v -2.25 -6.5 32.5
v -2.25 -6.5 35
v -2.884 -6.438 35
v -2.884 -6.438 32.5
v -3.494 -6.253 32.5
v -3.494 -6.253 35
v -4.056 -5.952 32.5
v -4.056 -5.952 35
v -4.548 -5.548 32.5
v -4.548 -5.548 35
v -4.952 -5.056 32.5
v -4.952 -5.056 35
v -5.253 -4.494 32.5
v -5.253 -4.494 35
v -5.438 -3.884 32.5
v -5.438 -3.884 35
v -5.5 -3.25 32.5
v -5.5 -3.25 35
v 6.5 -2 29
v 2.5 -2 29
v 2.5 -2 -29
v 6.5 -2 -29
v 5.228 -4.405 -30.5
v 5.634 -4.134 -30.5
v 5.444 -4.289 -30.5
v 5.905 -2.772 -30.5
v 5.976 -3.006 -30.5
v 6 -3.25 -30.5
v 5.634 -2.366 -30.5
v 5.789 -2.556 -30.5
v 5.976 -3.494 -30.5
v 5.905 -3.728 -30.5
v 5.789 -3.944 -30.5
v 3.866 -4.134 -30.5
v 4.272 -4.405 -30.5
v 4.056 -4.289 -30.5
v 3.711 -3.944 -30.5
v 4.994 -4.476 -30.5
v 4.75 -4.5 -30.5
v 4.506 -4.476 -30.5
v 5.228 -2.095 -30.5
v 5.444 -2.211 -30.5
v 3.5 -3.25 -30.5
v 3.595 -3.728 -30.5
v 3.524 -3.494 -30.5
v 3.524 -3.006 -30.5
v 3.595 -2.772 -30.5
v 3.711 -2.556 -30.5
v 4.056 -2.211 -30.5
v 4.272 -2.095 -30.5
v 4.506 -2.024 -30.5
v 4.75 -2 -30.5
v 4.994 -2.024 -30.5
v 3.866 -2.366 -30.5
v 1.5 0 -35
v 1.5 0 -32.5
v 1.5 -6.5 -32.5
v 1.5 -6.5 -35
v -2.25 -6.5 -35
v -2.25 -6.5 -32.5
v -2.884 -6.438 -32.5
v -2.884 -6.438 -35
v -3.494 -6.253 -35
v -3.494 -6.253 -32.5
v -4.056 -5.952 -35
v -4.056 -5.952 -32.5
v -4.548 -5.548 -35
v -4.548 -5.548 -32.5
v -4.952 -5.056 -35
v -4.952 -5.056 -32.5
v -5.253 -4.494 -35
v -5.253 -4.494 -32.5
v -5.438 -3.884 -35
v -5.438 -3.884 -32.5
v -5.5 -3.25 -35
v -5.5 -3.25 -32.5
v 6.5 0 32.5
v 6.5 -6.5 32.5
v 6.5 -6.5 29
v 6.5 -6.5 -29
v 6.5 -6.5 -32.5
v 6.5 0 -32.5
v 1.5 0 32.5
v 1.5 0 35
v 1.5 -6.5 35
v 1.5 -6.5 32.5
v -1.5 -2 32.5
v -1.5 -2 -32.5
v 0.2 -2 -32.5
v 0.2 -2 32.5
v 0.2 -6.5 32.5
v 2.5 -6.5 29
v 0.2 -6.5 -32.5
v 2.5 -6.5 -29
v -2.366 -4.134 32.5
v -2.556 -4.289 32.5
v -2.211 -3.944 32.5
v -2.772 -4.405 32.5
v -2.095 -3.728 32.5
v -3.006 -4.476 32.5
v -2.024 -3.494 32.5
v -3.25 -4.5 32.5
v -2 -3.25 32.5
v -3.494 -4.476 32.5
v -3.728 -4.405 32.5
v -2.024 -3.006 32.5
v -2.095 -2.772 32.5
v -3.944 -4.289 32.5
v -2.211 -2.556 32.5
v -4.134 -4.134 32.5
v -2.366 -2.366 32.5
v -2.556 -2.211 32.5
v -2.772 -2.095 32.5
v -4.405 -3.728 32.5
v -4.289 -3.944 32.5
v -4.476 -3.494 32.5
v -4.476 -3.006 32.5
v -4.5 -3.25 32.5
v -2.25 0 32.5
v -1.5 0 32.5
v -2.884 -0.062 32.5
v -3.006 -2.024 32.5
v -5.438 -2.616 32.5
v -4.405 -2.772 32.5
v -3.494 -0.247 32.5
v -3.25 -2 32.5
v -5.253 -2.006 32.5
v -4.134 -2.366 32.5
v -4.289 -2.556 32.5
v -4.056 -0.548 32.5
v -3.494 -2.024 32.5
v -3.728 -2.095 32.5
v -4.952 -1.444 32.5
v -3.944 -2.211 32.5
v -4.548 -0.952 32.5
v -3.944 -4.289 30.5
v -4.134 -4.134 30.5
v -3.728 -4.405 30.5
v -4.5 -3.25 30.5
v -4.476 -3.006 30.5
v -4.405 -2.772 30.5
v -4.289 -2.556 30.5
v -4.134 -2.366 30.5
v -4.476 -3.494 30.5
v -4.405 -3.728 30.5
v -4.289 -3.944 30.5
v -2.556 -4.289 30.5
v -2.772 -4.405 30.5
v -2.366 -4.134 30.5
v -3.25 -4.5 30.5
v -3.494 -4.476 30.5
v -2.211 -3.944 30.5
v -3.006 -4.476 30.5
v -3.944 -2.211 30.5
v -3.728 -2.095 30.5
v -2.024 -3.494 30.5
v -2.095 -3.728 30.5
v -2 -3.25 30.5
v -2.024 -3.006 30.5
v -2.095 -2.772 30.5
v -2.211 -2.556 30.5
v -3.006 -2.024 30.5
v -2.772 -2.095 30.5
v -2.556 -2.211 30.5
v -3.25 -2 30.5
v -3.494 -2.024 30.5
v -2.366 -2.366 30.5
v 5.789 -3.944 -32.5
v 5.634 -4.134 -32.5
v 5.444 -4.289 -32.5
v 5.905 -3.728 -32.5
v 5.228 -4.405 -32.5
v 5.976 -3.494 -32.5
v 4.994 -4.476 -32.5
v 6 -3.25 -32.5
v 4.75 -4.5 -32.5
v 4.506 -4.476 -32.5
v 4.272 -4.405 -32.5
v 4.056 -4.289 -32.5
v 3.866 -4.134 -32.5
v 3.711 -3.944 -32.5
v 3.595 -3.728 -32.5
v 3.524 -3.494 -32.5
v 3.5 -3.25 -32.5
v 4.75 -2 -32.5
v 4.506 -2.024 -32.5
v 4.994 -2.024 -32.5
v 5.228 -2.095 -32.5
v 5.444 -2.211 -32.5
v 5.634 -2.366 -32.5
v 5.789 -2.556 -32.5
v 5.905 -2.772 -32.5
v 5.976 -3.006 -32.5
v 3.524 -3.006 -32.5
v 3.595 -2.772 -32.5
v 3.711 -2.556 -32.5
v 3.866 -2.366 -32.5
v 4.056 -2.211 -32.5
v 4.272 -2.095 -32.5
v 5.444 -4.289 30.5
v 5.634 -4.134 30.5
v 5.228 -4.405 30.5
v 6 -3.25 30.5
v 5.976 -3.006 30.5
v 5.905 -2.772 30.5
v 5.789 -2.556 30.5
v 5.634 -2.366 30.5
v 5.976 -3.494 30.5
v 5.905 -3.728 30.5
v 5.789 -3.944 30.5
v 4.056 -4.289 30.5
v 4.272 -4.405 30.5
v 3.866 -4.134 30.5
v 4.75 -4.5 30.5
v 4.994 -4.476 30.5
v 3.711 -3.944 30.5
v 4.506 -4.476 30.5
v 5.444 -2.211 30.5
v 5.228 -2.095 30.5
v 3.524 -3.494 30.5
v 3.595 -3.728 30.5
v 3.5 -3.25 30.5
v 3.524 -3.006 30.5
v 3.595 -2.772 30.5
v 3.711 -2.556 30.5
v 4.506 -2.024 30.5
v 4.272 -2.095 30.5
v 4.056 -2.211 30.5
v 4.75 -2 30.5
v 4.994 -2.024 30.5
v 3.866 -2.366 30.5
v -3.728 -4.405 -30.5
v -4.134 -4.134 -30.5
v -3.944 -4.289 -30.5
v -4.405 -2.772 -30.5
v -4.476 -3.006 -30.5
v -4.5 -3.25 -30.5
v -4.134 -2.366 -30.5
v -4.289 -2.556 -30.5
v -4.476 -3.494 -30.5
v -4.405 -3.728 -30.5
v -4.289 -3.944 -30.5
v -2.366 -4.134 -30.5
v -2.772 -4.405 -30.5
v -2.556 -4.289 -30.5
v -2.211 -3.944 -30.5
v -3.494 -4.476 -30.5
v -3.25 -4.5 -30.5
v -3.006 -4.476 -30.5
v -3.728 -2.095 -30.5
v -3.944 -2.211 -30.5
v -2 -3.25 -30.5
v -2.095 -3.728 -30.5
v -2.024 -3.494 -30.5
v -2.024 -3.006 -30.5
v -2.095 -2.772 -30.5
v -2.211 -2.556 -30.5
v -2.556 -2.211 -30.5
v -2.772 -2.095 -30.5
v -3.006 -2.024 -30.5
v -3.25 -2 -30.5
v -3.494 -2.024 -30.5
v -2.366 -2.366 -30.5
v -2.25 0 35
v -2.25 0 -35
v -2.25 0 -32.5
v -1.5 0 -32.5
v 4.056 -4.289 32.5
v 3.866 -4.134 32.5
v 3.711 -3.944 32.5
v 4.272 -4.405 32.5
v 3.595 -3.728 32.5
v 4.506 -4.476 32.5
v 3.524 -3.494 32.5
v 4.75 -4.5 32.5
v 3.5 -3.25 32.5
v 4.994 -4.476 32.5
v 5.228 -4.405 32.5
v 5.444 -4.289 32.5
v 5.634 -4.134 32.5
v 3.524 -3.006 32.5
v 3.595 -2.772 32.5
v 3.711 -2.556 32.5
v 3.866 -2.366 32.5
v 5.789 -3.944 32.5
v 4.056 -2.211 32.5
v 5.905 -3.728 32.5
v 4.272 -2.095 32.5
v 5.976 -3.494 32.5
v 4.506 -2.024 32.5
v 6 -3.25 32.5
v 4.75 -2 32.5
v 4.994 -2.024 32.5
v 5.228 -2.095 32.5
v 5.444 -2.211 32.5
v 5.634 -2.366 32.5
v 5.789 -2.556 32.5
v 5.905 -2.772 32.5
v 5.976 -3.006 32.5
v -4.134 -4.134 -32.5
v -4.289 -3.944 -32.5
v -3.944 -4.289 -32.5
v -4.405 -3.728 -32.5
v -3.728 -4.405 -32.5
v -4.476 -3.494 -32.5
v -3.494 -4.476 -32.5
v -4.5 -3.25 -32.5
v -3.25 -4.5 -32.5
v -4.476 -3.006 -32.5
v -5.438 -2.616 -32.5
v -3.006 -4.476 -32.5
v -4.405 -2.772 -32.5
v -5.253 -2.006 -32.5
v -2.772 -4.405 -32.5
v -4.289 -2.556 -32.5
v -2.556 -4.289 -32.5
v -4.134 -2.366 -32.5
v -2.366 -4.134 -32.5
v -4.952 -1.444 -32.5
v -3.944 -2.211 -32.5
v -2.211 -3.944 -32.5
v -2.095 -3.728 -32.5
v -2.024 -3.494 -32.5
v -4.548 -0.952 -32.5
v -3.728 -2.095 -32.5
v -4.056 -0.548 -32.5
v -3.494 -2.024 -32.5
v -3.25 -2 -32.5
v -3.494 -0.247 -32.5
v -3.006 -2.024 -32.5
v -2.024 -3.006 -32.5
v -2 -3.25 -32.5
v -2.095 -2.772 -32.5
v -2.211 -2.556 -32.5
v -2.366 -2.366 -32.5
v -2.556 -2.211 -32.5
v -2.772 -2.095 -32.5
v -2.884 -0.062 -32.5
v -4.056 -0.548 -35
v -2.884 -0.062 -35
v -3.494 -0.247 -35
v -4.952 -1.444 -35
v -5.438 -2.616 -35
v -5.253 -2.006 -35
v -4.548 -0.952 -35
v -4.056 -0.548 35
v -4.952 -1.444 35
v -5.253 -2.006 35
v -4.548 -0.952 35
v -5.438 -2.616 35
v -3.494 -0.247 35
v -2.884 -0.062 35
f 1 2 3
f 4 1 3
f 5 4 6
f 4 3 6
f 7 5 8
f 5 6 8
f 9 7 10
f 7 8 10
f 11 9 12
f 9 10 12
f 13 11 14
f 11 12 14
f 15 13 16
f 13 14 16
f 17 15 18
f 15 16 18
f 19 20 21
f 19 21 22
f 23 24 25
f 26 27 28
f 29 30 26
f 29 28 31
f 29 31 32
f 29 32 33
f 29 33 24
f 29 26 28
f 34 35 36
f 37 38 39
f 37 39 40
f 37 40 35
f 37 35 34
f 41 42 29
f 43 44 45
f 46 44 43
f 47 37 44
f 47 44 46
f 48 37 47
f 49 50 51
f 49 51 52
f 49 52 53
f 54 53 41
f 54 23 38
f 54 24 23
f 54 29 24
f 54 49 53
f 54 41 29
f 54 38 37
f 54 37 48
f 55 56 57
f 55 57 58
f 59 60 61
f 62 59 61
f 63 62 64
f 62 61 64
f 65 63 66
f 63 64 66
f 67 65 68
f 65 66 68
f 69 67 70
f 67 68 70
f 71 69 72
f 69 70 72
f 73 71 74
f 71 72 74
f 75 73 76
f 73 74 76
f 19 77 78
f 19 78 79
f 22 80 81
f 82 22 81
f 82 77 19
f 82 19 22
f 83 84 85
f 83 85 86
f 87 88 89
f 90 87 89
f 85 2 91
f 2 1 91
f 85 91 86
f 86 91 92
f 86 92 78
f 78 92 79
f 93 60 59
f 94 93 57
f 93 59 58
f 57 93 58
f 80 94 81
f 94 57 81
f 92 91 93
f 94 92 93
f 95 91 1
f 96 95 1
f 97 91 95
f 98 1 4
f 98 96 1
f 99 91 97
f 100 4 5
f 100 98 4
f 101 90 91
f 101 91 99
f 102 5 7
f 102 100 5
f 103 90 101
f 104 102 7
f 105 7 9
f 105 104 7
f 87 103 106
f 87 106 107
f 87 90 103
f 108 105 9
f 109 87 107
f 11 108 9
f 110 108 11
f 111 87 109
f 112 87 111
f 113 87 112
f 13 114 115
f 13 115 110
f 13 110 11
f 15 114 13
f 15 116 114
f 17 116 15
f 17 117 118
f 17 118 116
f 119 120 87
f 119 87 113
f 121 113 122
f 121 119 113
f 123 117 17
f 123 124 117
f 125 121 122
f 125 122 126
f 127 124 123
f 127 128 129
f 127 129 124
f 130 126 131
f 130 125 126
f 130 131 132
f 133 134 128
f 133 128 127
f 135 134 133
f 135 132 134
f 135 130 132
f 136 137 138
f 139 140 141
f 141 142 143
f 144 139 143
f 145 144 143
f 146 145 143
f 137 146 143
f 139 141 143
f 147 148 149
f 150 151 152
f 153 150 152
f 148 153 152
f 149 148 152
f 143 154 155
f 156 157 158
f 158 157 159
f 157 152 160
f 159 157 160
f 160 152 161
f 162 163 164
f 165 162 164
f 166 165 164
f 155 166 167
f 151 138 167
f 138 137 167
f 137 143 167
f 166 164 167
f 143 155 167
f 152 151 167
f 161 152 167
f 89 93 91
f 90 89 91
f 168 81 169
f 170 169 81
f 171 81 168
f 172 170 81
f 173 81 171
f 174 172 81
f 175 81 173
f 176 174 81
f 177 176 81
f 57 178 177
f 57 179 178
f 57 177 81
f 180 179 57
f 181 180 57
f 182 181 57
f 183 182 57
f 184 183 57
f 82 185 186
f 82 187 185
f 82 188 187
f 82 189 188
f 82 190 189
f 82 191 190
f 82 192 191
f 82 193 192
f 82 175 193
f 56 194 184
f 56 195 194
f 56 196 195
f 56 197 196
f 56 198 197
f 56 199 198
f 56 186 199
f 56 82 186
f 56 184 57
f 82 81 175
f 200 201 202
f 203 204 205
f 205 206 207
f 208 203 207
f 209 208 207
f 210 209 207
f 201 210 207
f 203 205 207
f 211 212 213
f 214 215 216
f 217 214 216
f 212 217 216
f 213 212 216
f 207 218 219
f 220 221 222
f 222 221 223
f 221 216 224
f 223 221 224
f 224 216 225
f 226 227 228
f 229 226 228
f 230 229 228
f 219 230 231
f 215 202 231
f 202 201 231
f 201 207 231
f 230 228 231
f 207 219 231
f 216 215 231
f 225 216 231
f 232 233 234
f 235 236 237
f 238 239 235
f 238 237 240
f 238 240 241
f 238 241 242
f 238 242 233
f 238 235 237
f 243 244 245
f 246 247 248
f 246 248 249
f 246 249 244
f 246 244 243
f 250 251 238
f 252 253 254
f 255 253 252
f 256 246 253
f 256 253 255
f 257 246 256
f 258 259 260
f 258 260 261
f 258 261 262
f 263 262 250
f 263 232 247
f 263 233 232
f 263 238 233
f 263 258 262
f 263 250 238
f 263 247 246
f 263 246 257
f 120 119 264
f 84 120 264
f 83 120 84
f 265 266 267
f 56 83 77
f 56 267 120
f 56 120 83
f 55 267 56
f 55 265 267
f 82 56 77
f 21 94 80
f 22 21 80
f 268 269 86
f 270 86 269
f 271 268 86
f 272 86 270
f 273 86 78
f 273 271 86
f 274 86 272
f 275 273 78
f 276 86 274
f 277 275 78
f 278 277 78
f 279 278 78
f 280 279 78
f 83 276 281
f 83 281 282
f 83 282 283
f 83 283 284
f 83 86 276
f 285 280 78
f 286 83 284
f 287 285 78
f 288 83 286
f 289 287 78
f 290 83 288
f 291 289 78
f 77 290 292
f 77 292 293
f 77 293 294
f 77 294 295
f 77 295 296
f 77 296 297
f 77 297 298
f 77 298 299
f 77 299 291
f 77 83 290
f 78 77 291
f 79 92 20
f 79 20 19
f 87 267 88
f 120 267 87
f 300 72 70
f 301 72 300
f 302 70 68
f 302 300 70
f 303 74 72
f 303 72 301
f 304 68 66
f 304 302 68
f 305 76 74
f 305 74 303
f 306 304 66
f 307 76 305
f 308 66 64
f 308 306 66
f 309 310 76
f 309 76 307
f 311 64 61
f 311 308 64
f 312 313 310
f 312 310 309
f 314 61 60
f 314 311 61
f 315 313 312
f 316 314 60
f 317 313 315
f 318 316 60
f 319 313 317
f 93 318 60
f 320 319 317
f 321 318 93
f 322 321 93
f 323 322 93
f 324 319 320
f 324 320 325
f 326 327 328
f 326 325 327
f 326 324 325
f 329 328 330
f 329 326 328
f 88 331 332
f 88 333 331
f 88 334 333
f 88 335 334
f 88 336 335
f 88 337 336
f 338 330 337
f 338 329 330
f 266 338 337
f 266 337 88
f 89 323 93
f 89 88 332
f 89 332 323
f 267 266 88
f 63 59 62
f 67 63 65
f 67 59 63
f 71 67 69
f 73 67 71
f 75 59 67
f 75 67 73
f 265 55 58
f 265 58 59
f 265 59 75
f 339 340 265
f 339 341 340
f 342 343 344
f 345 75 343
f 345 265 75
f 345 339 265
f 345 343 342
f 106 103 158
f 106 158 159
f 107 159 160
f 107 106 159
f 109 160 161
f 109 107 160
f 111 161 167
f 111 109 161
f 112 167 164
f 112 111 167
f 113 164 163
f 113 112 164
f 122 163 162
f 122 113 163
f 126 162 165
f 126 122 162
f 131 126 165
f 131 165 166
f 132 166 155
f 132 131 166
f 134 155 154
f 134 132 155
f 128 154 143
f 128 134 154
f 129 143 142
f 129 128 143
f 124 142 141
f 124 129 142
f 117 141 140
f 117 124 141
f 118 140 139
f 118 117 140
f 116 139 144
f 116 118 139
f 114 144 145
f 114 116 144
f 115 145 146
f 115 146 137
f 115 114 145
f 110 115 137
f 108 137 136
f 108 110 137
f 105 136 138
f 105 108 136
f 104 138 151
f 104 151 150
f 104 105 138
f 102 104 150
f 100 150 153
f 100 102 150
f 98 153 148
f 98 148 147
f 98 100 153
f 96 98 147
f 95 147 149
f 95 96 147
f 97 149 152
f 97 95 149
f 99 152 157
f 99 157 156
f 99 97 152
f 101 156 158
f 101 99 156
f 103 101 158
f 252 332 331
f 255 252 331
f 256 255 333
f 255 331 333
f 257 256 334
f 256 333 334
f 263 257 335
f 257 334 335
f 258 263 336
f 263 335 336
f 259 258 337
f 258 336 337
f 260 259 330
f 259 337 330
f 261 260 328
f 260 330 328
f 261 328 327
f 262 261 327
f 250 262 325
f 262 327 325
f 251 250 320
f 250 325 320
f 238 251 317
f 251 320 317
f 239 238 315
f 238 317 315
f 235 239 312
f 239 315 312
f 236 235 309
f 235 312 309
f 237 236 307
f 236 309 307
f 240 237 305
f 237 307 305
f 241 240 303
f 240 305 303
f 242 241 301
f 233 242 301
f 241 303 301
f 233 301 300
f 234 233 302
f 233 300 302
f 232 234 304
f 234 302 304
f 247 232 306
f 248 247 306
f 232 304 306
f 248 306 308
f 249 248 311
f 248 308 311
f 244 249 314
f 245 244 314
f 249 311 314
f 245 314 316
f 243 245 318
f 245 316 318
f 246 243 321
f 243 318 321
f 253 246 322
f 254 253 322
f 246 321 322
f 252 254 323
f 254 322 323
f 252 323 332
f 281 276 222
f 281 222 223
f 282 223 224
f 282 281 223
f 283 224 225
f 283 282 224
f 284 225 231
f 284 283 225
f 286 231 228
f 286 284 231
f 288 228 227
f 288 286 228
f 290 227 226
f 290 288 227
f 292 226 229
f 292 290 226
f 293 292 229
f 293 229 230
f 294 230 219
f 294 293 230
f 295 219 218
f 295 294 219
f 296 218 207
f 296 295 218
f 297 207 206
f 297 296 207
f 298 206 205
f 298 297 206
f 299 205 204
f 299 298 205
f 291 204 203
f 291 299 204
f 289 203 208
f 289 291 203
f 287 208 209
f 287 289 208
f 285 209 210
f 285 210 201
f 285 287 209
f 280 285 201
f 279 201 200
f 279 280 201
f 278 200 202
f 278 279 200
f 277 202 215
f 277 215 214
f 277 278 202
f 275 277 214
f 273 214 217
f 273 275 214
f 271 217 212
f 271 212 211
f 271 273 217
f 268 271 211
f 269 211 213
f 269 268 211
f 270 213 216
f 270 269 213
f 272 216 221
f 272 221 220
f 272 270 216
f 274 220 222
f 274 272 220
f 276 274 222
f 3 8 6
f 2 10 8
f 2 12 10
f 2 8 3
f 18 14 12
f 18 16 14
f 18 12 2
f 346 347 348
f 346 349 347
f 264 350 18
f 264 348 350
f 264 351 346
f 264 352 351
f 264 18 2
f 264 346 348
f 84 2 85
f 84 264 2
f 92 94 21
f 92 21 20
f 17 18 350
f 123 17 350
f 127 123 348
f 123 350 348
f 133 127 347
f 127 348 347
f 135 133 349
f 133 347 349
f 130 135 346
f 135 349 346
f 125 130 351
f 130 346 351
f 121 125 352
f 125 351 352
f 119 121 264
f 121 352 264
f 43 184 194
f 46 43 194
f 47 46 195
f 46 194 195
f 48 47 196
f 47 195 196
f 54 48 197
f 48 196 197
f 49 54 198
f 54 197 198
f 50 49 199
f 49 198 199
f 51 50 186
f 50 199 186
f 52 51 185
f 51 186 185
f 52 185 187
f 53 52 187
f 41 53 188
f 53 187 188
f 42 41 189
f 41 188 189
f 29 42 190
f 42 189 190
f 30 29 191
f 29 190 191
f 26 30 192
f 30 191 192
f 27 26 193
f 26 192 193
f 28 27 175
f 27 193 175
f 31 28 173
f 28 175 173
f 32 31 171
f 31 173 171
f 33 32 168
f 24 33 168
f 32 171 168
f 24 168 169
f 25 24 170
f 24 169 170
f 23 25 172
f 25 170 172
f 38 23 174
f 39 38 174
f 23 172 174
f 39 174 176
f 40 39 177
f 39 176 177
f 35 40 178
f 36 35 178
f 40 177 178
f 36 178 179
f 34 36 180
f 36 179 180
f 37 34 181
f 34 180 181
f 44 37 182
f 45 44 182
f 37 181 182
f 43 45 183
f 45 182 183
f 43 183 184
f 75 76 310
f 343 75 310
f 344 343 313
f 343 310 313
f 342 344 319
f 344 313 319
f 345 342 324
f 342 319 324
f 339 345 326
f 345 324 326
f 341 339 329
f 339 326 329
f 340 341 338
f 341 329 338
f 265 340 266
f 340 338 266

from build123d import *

# Parameters (mm, degrees)
BOSS_EXTRUDE1_DEPTH = 6.5
CUT_EXTRUDE3_DEPTH  = 71.600991494
SKETCH4_W           = 4
SKETCH4_H           = 58
SKETCH4_W_2         = 1.7
SKETCH4_H_2         = 65
CUT_EXTRUDE4_DEPTH  = 4.5
SKETCH5_R           = 1.25
BOSS_EXTRUDE2_DEPTH = 2
SKETCH6_R           = 1.25
CUT_EXTRUDE5_DEPTH  = 2


with BuildPart() as part:
    # Sketch1 → Boss-Extrude1 (new body)
    with BuildSketch(Plane(origin=(0, 0, 0), x_dir=(1, 0, 0), z_dir=(0, 1, 0))):
        Polygon((1.5, -32.5), (6.5, -32.5), (6.5, 32.5), (1.5, 32.5), (1.5, 35), (-5.5, 35), (-5.5, 32.5), (-1.5, 32.5), (-1.5, -32.5), (-5.5, -32.5), (-5.5, -35), (1.5, -35), align=None)
    extrude(amount=-BOSS_EXTRUDE1_DEPTH)

    # Sketch3 → Cut-Extrude3 (cut, through all)
    with BuildSketch(Plane.XY.offset(35)):
        with BuildLine():
            Line((-5.5, 0), (-5.5, -3.25))
            ThreePointArc((-5.5, -3.25), (-4.548097039, -0.951902961), (-2.25, 0))
            Line((-2.25, 0), (-5.5, 0))
        make_face()
        with BuildLine():
            Line((-5.5, -6.5), (-2.25, -6.5))
            ThreePointArc((-2.25, -6.5), (-4.548097039, -5.548097039), (-5.5, -3.25))
            Line((-5.5, -3.25), (-5.5, -6.5))
        make_face()
    extrude(amount=-CUT_EXTRUDE3_DEPTH, mode=Mode.SUBTRACT)

    # Sketch4 → Cut-Extrude4 (cut)
    with BuildSketch(Plane.XZ.offset(6.5)):
        with Locations((4.5, 0)):
            Rectangle(SKETCH4_W, SKETCH4_H)
        with Locations((-0.65, 0)):
            Rectangle(SKETCH4_W_2, SKETCH4_H_2)
    extrude(amount=-CUT_EXTRUDE4_DEPTH, mode=Mode.SUBTRACT)

    # Sketch5 → Boss-Extrude2 (add)
    with BuildSketch(Plane.XY.offset(-32.5)):
        with Locations((-3.25, -3.25)):
            Circle(SKETCH5_R)
    boss_extrude2 = extrude(amount=BOSS_EXTRUDE2_DEPTH)

    # Sketch6 → Cut-Extrude5 (cut)
    with BuildSketch(Plane(origin=(0, 0, -32.5), x_dir=(-1, 0, 0), z_dir=(0, 0, -1))):
        with Locations((-4.75, -3.25)):
            Circle(SKETCH6_R)
    cut_extrude5 = extrude(amount=-CUT_EXTRUDE5_DEPTH, mode=Mode.SUBTRACT)

    # Mirror1: Boss-Extrude2, Cut-Extrude5 across plane
    add(boss_extrude2.mirror(Plane.XY))
    add(cut_extrude5.mirror(Plane.XY), mode=Mode.SUBTRACT)


solid = part.part
